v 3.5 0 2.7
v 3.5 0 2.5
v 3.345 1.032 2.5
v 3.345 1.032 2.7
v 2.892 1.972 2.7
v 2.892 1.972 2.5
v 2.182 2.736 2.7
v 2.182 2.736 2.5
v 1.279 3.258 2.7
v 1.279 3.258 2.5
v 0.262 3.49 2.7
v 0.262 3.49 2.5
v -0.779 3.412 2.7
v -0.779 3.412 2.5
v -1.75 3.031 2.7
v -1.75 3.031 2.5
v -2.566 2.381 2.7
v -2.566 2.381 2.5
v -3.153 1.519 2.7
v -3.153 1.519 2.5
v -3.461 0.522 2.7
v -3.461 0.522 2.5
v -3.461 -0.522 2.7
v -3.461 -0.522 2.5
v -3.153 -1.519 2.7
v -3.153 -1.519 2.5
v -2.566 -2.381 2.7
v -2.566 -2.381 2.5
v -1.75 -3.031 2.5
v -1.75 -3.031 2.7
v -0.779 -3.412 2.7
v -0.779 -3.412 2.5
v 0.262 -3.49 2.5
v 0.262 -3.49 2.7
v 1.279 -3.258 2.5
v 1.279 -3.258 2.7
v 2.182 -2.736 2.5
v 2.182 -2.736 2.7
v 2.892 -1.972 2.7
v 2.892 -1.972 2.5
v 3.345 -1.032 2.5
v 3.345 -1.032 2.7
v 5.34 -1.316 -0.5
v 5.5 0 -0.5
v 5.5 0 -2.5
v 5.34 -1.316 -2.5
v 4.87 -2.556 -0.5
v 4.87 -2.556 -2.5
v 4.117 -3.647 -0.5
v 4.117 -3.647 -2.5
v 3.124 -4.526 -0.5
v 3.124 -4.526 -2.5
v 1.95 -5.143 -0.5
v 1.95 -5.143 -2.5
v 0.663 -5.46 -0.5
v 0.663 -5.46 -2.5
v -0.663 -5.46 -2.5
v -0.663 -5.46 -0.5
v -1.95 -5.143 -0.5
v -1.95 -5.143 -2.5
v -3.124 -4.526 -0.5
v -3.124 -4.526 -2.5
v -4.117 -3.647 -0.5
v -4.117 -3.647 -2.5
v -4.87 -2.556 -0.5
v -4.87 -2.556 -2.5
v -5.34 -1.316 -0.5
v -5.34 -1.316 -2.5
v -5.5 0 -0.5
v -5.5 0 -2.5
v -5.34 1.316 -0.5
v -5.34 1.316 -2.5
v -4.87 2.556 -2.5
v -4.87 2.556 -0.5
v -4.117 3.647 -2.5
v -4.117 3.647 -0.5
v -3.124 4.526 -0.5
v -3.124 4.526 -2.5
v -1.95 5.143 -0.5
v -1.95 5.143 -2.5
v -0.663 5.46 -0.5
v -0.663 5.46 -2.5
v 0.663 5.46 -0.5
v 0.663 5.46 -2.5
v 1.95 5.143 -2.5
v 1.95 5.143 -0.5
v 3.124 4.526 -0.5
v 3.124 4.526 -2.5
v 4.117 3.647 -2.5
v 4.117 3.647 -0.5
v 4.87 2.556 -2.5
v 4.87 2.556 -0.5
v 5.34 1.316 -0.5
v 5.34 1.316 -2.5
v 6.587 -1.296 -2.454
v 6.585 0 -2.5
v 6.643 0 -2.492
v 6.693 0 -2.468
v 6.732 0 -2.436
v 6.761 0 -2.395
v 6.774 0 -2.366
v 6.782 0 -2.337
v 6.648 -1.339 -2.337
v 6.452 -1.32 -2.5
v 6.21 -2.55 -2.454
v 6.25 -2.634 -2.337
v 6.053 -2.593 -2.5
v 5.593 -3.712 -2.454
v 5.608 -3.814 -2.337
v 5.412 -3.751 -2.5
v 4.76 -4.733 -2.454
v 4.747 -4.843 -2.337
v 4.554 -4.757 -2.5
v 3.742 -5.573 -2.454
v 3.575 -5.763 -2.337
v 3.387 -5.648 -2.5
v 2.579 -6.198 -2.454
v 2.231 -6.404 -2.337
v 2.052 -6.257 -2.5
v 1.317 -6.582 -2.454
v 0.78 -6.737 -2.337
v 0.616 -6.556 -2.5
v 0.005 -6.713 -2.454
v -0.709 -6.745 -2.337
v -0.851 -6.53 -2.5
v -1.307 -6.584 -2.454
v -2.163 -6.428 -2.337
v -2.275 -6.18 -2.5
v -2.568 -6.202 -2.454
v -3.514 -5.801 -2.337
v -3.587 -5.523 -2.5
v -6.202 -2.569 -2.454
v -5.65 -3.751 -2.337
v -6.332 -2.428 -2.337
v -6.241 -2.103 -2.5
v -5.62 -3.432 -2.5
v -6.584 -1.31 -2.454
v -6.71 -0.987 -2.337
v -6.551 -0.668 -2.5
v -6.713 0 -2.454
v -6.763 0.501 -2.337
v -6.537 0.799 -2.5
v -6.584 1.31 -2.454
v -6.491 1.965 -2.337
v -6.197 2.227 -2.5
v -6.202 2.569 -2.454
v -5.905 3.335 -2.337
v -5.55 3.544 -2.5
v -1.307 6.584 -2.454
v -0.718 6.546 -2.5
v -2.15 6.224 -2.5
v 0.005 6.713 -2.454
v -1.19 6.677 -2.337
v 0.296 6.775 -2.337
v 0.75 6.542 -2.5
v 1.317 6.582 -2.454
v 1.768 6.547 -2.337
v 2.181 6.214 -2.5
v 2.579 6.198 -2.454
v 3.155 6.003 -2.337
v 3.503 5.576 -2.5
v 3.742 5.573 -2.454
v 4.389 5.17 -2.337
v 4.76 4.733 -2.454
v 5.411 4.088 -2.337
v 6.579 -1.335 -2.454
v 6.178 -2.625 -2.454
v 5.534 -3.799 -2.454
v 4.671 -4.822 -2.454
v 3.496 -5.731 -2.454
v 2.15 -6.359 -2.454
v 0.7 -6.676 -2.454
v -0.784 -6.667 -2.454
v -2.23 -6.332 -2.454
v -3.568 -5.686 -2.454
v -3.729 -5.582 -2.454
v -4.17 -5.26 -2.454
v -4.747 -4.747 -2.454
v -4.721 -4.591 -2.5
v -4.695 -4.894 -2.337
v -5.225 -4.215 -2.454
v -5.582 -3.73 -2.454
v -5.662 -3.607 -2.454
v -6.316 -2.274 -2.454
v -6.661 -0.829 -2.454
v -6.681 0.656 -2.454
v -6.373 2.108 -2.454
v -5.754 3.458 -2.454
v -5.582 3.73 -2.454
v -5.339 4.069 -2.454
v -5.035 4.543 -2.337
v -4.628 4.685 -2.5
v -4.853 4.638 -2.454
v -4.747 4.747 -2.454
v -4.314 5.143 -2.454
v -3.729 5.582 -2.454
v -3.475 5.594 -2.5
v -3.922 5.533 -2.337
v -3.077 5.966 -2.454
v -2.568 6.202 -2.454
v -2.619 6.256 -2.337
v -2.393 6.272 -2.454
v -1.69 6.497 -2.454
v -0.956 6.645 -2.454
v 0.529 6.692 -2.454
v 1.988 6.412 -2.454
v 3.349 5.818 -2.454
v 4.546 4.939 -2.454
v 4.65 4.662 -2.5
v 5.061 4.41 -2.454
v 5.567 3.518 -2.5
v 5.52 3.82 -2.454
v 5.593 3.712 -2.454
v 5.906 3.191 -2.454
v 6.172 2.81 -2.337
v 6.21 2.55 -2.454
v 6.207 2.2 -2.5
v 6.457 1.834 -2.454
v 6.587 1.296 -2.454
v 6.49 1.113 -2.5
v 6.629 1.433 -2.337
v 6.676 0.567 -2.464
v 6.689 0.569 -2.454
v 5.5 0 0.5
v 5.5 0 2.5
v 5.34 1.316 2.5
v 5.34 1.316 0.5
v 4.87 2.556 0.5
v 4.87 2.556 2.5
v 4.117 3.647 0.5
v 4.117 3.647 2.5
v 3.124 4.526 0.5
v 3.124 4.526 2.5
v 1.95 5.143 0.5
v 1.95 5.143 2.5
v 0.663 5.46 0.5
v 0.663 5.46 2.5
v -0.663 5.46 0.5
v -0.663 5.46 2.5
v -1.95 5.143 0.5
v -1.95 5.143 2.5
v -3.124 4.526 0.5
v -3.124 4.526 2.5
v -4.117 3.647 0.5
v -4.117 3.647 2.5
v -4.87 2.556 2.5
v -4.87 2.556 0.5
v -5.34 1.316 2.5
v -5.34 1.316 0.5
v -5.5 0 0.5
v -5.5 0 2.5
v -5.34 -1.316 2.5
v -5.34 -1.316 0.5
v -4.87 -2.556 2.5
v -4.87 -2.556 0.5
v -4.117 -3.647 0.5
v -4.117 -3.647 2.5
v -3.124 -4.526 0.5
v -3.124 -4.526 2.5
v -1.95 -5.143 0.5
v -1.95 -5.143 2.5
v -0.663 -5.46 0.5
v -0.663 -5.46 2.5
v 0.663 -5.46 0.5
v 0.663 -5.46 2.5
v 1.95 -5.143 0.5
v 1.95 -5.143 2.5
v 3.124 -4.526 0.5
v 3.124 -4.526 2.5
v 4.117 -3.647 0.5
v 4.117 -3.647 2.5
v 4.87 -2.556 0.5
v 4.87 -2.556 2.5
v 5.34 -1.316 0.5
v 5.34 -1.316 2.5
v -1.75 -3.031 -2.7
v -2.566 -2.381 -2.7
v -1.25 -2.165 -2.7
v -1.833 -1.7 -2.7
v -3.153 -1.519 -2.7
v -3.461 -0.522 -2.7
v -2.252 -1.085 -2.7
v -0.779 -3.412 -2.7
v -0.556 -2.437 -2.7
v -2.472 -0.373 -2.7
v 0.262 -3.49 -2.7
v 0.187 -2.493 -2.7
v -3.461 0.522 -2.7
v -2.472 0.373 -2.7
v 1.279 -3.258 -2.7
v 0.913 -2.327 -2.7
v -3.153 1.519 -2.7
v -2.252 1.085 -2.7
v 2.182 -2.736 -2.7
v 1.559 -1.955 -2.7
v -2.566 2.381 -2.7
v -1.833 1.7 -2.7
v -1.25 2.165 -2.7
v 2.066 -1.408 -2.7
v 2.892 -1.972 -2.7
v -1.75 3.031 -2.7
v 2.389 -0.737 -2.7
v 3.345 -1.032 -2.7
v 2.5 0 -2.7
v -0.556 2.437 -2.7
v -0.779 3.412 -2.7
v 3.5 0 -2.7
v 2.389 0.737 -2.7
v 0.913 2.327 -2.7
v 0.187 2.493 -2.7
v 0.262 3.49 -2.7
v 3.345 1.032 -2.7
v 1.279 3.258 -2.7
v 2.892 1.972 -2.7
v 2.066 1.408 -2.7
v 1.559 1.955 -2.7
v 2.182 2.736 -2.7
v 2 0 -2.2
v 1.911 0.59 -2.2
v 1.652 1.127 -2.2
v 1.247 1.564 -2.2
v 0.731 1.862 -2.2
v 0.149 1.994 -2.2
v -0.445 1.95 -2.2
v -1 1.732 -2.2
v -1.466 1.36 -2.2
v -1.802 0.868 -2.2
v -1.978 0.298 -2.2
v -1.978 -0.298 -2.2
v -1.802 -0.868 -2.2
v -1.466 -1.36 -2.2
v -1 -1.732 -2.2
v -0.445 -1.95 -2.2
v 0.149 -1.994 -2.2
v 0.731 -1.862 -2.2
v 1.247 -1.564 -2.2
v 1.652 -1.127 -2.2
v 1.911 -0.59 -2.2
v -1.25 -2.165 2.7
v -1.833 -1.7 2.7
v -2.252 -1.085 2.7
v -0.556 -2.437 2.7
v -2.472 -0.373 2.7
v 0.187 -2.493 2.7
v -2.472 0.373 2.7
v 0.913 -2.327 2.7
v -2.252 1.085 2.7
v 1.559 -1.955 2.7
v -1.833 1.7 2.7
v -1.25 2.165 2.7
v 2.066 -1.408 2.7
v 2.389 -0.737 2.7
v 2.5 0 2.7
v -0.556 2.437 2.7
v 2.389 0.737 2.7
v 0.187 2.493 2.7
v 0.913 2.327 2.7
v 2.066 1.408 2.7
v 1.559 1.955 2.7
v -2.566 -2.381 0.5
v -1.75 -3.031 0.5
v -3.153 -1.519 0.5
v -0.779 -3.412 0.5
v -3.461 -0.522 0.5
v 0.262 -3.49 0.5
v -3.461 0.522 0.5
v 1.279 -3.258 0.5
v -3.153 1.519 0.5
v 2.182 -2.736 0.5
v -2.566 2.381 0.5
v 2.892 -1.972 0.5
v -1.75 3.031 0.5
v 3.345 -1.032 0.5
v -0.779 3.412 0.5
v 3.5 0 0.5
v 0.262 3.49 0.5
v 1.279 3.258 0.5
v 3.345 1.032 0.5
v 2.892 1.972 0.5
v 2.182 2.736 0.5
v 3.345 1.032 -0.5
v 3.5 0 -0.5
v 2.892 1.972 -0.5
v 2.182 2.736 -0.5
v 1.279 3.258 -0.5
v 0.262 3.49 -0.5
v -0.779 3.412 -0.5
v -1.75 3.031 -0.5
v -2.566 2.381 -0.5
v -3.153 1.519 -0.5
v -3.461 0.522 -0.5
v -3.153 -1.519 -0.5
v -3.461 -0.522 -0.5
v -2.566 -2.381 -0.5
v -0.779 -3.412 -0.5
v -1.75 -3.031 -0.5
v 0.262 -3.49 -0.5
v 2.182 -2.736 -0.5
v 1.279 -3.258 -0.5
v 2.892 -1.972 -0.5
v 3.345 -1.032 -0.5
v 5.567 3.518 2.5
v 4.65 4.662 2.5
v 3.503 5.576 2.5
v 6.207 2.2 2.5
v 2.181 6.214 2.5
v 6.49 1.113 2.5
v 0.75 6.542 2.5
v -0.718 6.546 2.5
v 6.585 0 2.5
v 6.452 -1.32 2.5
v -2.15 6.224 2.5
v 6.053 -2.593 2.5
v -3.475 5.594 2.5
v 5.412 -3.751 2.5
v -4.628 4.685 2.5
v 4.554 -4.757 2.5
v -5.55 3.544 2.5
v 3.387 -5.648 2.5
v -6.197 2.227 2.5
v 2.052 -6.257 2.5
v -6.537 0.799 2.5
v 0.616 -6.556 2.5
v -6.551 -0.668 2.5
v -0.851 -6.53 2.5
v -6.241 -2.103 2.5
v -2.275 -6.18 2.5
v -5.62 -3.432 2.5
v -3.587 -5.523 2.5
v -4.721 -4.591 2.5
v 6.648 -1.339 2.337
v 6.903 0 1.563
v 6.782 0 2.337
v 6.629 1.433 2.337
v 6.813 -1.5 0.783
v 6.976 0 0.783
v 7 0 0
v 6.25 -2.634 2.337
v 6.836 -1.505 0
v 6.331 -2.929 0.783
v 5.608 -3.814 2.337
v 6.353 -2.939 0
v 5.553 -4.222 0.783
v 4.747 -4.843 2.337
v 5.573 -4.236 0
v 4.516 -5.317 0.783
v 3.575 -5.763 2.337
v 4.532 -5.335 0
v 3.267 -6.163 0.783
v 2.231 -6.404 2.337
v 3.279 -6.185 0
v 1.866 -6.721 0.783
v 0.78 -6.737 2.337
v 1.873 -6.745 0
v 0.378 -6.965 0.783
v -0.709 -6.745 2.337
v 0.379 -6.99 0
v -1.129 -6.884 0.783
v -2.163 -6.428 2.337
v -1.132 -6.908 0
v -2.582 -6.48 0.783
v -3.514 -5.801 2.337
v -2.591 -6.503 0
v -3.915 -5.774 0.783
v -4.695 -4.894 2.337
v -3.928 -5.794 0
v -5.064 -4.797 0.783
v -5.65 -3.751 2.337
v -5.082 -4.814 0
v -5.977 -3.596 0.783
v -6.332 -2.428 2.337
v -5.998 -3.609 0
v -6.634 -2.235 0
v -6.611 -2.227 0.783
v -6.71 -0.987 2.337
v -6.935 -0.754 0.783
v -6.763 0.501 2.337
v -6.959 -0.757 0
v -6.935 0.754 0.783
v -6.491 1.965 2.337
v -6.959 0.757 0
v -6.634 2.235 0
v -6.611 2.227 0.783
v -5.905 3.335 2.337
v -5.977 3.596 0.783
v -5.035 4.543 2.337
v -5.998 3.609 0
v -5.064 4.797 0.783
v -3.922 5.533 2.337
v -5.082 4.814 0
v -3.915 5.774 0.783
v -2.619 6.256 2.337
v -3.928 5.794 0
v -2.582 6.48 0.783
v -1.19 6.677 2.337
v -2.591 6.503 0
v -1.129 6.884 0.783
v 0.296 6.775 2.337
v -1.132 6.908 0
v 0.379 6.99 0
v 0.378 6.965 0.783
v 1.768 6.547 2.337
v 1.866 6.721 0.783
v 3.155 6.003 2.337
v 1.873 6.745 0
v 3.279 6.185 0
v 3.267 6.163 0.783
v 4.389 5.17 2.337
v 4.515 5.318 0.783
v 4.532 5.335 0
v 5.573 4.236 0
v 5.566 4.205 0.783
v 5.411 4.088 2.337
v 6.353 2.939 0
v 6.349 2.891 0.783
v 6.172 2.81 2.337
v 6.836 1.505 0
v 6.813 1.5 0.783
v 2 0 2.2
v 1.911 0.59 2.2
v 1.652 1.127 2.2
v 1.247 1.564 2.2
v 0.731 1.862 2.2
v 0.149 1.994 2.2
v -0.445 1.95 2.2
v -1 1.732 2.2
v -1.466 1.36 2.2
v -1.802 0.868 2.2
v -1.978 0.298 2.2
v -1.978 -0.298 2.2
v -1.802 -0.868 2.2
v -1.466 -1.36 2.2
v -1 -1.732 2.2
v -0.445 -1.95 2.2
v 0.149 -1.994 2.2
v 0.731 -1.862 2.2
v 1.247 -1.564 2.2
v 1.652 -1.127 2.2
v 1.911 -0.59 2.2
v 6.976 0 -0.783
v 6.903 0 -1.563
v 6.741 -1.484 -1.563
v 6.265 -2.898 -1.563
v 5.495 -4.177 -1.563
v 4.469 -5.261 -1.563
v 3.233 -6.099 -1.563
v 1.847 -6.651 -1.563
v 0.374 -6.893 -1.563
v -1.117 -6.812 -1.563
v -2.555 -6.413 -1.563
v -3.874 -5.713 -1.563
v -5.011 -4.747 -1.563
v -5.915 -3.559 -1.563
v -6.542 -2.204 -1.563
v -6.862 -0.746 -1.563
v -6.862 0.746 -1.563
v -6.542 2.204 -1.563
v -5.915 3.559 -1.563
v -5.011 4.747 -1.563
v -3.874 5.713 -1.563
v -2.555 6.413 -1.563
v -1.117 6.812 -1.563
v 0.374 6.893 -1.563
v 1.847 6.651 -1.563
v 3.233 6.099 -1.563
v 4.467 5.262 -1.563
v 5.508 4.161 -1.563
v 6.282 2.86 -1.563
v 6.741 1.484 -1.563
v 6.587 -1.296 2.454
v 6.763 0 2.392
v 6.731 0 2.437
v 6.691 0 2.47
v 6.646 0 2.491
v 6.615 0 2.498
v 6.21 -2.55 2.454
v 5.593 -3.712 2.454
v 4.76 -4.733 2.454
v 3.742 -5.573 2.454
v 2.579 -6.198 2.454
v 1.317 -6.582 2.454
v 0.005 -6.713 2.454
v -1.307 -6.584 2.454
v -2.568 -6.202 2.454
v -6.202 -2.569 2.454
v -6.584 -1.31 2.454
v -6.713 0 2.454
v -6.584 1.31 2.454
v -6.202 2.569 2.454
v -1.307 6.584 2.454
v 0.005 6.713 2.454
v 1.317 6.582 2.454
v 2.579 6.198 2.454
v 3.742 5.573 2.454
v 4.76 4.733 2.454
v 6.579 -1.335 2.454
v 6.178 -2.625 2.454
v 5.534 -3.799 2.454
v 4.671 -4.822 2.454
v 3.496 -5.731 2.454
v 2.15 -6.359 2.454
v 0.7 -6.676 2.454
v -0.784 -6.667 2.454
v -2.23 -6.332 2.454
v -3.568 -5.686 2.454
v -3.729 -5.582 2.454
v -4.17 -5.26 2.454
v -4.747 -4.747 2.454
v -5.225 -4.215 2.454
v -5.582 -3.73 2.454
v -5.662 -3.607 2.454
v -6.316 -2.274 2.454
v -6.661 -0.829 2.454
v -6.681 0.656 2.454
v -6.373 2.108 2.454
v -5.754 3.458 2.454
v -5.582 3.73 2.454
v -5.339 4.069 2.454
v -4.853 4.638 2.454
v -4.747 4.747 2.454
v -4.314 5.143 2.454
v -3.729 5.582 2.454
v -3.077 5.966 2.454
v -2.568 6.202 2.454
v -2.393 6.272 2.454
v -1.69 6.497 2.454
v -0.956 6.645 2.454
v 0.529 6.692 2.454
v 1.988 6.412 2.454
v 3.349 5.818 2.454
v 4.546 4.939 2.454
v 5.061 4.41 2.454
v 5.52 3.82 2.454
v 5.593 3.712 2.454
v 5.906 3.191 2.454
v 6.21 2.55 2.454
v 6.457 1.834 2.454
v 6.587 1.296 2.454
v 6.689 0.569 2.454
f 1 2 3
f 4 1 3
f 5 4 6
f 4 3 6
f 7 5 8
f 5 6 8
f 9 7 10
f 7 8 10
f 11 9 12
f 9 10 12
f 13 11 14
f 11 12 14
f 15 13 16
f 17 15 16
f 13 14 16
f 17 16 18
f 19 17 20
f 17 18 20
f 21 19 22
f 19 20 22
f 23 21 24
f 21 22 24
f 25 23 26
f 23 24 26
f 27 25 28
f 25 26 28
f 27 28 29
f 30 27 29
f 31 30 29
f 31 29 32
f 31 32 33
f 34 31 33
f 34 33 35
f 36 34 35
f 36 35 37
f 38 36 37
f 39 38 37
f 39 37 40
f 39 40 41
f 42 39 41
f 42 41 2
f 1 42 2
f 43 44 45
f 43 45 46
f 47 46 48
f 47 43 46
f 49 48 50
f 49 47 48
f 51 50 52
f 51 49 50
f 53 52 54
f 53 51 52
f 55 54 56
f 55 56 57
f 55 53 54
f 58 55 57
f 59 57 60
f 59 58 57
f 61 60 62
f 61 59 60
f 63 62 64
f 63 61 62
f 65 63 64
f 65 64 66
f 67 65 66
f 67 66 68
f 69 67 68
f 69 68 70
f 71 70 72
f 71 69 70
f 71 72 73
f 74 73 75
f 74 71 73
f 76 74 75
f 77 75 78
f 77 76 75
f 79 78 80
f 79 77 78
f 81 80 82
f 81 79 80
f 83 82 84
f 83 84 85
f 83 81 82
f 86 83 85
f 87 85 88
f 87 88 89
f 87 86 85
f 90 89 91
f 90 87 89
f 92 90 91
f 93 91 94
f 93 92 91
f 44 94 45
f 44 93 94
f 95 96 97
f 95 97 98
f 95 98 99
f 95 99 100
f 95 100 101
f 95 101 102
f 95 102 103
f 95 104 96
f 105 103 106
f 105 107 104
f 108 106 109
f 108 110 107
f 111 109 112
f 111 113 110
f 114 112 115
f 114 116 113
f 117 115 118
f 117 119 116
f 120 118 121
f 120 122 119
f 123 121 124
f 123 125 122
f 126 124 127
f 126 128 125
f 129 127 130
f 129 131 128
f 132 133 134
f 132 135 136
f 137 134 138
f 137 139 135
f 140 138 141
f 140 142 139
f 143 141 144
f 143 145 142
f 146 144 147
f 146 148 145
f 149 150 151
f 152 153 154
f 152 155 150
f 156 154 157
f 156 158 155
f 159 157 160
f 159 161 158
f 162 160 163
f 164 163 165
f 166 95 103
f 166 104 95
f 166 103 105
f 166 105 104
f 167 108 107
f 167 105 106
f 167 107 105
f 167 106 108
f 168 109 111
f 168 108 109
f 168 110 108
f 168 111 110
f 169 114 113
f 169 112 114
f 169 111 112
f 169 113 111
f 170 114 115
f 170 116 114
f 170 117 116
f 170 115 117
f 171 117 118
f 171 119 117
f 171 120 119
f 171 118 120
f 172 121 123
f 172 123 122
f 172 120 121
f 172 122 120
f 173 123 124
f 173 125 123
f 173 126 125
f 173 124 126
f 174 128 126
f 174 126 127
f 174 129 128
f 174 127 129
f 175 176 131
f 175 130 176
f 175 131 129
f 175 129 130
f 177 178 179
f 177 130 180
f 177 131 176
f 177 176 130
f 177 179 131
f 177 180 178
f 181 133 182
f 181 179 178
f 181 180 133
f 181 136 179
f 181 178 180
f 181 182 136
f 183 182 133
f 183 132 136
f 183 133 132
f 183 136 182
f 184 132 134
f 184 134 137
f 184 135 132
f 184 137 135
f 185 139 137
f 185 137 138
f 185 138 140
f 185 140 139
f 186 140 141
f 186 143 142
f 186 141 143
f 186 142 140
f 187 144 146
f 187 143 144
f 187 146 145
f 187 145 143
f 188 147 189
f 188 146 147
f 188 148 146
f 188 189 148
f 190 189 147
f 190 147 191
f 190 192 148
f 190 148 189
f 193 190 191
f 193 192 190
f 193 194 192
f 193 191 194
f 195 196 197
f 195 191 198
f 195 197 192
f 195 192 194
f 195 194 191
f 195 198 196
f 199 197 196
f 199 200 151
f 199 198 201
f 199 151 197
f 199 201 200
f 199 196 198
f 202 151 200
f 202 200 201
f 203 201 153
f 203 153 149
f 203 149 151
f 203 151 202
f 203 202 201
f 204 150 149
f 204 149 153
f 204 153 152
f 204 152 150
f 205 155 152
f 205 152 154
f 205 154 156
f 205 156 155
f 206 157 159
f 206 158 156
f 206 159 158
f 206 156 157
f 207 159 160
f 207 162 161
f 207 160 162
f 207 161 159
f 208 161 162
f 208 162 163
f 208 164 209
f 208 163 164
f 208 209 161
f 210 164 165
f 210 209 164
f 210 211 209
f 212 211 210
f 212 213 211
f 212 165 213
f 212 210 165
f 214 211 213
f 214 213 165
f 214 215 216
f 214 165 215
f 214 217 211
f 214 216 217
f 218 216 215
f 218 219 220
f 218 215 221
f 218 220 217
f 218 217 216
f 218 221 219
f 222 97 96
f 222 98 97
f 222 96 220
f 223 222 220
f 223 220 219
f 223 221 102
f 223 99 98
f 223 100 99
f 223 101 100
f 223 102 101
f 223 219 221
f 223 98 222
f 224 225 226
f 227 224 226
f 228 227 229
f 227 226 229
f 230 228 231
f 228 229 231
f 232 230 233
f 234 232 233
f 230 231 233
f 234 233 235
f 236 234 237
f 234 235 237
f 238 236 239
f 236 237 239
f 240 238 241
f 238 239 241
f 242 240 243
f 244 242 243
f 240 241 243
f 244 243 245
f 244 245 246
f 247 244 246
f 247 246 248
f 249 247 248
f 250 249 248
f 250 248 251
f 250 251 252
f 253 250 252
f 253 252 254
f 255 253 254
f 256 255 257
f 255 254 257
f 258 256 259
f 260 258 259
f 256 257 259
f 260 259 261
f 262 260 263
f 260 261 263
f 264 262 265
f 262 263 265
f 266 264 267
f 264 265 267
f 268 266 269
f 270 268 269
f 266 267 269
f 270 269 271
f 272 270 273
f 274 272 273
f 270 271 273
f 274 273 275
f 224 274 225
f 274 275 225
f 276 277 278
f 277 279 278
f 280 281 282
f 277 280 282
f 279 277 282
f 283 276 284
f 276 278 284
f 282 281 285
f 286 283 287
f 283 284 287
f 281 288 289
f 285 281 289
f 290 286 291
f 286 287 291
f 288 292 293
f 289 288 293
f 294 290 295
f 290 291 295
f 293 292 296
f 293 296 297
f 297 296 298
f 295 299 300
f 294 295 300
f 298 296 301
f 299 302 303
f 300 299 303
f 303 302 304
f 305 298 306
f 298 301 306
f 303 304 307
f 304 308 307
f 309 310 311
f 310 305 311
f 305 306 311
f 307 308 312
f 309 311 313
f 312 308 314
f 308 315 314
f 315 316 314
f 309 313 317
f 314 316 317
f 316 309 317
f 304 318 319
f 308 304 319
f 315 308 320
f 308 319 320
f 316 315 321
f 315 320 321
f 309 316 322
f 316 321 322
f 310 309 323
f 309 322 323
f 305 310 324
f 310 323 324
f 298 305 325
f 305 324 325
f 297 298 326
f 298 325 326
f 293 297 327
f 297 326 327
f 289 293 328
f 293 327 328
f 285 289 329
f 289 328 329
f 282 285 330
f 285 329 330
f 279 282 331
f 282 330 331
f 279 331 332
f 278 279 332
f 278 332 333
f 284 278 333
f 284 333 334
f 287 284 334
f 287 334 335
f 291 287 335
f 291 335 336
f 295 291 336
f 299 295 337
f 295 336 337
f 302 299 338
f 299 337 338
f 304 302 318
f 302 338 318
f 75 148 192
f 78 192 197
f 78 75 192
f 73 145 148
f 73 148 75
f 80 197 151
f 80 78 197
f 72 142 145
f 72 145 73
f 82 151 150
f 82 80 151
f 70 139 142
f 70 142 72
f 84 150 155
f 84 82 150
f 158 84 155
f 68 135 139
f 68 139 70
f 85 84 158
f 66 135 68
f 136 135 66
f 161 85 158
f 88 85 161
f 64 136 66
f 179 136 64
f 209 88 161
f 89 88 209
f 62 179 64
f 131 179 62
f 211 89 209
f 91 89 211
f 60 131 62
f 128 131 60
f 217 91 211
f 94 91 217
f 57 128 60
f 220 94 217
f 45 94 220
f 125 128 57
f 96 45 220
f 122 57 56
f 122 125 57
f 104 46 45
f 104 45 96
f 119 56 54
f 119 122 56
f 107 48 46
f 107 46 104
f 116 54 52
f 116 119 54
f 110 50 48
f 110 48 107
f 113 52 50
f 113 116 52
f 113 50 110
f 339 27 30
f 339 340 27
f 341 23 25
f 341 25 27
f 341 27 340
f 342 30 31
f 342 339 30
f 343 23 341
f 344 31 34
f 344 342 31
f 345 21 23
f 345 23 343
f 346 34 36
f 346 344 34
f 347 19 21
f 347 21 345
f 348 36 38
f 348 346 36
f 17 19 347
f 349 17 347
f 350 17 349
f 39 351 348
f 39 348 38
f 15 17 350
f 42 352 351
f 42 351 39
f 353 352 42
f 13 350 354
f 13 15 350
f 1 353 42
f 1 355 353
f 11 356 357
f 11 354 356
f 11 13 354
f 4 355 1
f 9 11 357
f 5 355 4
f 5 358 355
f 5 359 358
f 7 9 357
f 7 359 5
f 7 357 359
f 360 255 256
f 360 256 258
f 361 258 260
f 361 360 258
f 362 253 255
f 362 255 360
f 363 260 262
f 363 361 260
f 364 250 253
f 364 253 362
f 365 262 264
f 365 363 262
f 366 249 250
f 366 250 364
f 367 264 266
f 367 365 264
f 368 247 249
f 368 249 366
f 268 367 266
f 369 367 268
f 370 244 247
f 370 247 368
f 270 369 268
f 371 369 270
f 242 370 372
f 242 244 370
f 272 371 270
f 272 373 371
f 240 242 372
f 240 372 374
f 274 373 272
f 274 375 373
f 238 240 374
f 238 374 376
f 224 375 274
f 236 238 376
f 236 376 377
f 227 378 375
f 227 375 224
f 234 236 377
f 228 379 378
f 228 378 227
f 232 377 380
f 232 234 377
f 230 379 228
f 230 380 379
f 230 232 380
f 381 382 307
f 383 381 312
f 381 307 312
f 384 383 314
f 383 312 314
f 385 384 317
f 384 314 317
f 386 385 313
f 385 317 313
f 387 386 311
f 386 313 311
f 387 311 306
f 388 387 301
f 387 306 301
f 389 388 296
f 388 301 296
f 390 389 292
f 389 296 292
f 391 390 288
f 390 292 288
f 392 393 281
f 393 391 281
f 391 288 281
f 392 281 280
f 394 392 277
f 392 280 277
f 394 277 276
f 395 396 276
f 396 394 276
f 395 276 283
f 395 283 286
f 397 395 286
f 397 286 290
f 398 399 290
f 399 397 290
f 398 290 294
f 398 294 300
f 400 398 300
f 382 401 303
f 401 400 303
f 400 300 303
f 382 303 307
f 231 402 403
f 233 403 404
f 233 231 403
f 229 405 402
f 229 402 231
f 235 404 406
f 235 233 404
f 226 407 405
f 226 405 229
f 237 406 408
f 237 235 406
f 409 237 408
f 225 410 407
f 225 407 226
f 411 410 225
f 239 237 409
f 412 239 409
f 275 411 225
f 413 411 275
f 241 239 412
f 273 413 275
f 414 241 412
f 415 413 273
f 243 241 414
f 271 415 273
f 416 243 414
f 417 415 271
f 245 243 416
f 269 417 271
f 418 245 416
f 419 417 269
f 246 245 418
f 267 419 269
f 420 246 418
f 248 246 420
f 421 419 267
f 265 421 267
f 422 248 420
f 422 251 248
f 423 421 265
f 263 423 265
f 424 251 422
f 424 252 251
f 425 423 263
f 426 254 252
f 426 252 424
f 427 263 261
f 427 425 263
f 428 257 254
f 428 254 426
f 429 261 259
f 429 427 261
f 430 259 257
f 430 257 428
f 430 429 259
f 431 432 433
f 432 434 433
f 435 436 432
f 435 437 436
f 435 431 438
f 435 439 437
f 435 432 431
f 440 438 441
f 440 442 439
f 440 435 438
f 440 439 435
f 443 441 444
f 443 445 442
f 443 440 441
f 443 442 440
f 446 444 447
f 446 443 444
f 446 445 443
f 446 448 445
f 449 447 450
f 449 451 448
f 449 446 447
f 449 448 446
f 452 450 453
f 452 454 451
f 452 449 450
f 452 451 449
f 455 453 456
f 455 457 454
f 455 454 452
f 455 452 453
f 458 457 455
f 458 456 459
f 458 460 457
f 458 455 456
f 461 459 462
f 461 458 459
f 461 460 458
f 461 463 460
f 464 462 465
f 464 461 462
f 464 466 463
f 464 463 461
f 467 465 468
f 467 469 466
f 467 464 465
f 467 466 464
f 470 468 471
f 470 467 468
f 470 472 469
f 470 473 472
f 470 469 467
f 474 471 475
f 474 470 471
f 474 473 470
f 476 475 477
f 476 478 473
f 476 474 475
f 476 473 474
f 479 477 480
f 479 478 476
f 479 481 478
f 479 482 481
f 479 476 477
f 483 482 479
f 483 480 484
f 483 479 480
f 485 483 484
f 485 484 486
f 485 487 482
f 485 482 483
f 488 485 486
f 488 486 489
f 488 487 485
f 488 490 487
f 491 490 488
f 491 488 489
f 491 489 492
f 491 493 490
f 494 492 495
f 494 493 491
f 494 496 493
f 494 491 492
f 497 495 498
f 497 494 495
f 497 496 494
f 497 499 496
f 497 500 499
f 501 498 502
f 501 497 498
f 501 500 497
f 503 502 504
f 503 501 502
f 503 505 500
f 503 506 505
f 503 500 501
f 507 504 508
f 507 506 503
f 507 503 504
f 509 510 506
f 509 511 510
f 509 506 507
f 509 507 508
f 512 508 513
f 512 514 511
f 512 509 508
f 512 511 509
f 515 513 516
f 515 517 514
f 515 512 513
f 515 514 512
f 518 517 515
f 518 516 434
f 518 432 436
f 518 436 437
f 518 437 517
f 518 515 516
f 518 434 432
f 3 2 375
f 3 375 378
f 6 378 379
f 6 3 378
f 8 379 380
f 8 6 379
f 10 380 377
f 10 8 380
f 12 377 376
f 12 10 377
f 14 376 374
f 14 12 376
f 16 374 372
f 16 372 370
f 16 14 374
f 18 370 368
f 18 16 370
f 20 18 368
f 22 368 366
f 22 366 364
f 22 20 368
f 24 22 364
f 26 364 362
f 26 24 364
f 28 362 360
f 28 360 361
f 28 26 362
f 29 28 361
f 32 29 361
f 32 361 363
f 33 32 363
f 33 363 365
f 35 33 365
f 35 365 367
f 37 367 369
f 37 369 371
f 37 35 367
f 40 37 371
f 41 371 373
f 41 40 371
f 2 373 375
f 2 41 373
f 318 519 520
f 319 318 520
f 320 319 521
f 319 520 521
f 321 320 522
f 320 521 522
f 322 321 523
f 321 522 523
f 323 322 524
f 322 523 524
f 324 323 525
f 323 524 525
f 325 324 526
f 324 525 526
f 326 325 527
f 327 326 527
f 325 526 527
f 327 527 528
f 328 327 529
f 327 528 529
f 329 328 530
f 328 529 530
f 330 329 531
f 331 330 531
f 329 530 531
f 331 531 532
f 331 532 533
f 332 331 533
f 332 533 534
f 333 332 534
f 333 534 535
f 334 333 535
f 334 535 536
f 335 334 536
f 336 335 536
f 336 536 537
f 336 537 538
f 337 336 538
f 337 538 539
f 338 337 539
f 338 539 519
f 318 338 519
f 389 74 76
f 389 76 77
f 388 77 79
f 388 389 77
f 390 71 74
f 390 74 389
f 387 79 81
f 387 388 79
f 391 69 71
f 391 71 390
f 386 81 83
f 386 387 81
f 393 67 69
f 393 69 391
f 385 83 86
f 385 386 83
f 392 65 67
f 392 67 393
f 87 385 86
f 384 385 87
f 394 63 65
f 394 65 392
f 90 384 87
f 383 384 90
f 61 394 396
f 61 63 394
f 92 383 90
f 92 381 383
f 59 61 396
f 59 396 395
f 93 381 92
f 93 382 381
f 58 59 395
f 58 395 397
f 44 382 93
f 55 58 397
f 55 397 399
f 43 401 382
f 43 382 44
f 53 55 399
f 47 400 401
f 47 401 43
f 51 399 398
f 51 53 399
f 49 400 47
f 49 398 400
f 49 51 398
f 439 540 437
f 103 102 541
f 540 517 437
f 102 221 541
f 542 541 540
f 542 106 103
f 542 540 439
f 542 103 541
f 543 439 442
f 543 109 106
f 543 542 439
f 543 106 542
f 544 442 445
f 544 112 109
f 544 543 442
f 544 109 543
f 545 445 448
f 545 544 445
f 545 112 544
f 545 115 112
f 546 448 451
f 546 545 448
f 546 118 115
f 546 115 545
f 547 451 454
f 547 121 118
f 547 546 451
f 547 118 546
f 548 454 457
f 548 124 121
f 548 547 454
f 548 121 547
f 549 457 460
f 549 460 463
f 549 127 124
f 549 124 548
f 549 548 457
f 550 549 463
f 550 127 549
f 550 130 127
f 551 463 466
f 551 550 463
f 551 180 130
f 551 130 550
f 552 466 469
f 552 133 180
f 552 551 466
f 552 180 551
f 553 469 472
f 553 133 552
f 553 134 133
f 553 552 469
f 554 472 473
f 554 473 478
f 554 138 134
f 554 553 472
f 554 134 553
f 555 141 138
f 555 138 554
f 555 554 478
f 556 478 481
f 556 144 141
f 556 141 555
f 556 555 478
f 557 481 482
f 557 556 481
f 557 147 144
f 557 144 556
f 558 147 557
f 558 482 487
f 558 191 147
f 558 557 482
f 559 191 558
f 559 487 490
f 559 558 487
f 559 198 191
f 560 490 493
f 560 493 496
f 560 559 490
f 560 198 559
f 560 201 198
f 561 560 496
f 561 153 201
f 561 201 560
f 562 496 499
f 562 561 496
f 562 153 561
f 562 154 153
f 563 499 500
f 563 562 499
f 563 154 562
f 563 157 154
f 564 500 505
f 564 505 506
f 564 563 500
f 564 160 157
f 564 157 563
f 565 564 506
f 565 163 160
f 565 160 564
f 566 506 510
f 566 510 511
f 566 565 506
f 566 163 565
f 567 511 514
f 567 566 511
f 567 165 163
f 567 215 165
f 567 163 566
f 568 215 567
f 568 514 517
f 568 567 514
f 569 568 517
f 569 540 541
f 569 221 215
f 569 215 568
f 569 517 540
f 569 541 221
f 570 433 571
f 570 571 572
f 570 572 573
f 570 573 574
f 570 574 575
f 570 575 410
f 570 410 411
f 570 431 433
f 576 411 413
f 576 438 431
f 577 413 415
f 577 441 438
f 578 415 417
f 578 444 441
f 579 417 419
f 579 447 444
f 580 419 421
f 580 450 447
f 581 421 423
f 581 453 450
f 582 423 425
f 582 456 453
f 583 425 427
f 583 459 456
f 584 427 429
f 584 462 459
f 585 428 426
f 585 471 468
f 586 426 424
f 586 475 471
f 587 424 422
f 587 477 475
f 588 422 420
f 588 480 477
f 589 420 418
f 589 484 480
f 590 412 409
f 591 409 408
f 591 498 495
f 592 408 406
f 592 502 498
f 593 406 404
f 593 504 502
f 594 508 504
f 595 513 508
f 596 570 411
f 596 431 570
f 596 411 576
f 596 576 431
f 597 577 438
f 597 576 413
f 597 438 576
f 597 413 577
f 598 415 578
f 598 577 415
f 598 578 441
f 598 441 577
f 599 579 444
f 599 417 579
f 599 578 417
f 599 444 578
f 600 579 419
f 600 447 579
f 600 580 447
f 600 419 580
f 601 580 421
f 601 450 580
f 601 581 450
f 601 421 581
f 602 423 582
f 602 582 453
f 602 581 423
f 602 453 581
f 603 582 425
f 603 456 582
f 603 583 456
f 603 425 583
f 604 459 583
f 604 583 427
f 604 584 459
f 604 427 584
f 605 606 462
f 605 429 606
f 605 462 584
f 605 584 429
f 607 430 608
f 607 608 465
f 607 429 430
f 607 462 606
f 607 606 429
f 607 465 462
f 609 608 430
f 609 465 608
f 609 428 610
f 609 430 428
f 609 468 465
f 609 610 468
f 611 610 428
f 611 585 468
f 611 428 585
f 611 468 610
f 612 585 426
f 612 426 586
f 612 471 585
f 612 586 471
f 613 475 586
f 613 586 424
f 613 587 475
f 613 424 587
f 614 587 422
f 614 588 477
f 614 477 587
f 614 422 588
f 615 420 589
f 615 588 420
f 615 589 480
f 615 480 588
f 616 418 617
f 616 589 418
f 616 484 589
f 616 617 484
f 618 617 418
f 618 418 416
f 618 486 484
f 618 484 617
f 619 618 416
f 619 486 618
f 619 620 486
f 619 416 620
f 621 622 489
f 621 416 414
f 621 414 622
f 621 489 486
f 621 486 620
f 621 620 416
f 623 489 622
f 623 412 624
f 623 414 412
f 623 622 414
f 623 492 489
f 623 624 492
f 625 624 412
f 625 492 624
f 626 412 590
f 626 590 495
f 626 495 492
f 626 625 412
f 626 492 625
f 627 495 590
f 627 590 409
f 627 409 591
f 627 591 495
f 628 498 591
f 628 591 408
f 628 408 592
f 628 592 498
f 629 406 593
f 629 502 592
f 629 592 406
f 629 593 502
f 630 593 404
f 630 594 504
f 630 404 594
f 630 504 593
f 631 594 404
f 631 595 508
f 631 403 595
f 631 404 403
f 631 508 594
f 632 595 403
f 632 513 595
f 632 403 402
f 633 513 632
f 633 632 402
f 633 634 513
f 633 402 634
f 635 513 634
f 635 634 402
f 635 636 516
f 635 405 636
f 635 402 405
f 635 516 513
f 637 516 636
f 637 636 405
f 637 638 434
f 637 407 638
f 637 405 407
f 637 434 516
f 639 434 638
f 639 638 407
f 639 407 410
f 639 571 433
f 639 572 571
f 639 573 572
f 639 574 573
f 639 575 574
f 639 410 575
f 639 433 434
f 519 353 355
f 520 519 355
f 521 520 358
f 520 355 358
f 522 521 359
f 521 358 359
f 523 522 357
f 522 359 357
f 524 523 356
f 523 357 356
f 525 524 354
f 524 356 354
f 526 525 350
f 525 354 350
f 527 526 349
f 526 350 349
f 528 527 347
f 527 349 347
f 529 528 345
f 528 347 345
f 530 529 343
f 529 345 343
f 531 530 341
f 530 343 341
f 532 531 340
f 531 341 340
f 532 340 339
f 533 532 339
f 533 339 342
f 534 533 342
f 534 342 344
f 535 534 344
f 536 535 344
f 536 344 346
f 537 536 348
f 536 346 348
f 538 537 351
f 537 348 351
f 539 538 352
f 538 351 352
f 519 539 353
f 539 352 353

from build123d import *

# Parameters (mm, degrees)
EXTRUDE_1_DEPTH      = 0.2
EXTRUDE_1_DEPTH_BACK = 5.2
SKETCH_2_R           = 3.5
CUT_EXTRUDE_1_REACH  = 13.277
SKETCH_3_R           = 2
SKETCH_4_R           = 5.5
SKETCH_4_R_2         = 3.5
CUT_EXTRUDE_2_DEPTH  = 2
CUT_EXTRUDE_START    = -2
SKETCH_5_R           = 5.5
SKETCH_5_R_2         = 3.5
CUT_EXTRUDE_3_DEPTH  = 2
FILLET_1_R           = 0.2
CHAMFER_1_SIZE       = 0.5


with BuildPart() as part:
    # 草图1 → 旋转1 (revolve)
    with BuildSketch(Plane(origin=(0, 0, 0), x_dir=(0, 0, -1), z_dir=(1, 0, 0)), mode=Mode.PRIVATE) as revolve_1_sk:
        with BuildLine():
            Line((-2.5, 0), (-2.5, 6.75))
            ThreePointArc((-2.5, 6.75), (-1.256234453, 6.937344526), (0, 7))
            ThreePointArc((0, 7), (1.256234453, 6.937344526), (2.5, 6.75))
            Line((2.5, 6.75), (2.5, 0))
            Line((2.5, 0), (-2.5, 0))
        make_face()
    revolve(revolve_1_sk.sketch.rotate(Axis((0, 0, 3.62963917), (0, 0, -1)), 90), axis=Axis((0, 0, 3.62963917), (0, 0, -1)))

    # 草图2 → 凸台-拉伸1 (add, two sides: drawn at the far end of the back side and taken through both)
    with BuildSketch(Plane.XY.offset(2.5).offset(-EXTRUDE_1_DEPTH_BACK)):
        Circle(SKETCH_2_R)
    extrude(amount=EXTRUDE_1_DEPTH + EXTRUDE_1_DEPTH_BACK)

    # 草图3 → 切除-拉伸1 (cut, up to next)
    with BuildSketch(Plane.XY.offset(2.7), mode=Mode.PRIVATE) as cut_extrude_1_sk1:
        Circle(SKETCH_3_R)
    cut_extrude_1_tool1 = extrude(cut_extrude_1_sk1.sketch, amount=-CUT_EXTRUDE_1_REACH, mode=Mode.PRIVATE) & part.part
    add(cut_extrude_1_tool1.solids().sort_by_distance((0, 0, 2.7))[0], mode=Mode.SUBTRACT)

    # 草图4 → 切除-拉伸2 (cut)
    with BuildSketch(Plane.XY.offset(2.5)):
        Circle(SKETCH_4_R)
        Circle(SKETCH_4_R_2, mode=Mode.SUBTRACT)
    extrude(amount=-CUT_EXTRUDE_2_DEPTH, mode=Mode.SUBTRACT)

    # 草图5 → 切除-拉伸3 (cut)
    with BuildSketch(Plane(origin=(0, 0, -2.5), x_dir=(-1, 0, 0), z_dir=(0, 0, -1)).offset(CUT_EXTRUDE_START)):
        with Locations(Location((0, 0, 0), (0, 0, 180))):
            Circle(SKETCH_5_R)
        with Locations(Location((0, 0, 0), (0, 0, 180))):
            Circle(SKETCH_5_R_2, mode=Mode.SUBTRACT)
    extrude(amount=CUT_EXTRUDE_3_DEPTH, mode=Mode.SUBTRACT)

    # 圆角1
    fillet_1_edges = [part.edges().sort_by_distance(p)[0] for p in [
        (-6.75, 0, 2.5),
        (-6.75, 0, -2.5),
    ]]
    fillet(fillet_1_edges, radius=FILLET_1_R)

    # 倒角1
    chamfer_1_edges = [part.edges().sort_by_distance(p)[0] for p in [
        (-2, 0, 2.7),
        (-2, 0, -2.7),
    ]]
    chamfer(chamfer_1_edges, length=CHAMFER_1_SIZE)


solid = part.part
